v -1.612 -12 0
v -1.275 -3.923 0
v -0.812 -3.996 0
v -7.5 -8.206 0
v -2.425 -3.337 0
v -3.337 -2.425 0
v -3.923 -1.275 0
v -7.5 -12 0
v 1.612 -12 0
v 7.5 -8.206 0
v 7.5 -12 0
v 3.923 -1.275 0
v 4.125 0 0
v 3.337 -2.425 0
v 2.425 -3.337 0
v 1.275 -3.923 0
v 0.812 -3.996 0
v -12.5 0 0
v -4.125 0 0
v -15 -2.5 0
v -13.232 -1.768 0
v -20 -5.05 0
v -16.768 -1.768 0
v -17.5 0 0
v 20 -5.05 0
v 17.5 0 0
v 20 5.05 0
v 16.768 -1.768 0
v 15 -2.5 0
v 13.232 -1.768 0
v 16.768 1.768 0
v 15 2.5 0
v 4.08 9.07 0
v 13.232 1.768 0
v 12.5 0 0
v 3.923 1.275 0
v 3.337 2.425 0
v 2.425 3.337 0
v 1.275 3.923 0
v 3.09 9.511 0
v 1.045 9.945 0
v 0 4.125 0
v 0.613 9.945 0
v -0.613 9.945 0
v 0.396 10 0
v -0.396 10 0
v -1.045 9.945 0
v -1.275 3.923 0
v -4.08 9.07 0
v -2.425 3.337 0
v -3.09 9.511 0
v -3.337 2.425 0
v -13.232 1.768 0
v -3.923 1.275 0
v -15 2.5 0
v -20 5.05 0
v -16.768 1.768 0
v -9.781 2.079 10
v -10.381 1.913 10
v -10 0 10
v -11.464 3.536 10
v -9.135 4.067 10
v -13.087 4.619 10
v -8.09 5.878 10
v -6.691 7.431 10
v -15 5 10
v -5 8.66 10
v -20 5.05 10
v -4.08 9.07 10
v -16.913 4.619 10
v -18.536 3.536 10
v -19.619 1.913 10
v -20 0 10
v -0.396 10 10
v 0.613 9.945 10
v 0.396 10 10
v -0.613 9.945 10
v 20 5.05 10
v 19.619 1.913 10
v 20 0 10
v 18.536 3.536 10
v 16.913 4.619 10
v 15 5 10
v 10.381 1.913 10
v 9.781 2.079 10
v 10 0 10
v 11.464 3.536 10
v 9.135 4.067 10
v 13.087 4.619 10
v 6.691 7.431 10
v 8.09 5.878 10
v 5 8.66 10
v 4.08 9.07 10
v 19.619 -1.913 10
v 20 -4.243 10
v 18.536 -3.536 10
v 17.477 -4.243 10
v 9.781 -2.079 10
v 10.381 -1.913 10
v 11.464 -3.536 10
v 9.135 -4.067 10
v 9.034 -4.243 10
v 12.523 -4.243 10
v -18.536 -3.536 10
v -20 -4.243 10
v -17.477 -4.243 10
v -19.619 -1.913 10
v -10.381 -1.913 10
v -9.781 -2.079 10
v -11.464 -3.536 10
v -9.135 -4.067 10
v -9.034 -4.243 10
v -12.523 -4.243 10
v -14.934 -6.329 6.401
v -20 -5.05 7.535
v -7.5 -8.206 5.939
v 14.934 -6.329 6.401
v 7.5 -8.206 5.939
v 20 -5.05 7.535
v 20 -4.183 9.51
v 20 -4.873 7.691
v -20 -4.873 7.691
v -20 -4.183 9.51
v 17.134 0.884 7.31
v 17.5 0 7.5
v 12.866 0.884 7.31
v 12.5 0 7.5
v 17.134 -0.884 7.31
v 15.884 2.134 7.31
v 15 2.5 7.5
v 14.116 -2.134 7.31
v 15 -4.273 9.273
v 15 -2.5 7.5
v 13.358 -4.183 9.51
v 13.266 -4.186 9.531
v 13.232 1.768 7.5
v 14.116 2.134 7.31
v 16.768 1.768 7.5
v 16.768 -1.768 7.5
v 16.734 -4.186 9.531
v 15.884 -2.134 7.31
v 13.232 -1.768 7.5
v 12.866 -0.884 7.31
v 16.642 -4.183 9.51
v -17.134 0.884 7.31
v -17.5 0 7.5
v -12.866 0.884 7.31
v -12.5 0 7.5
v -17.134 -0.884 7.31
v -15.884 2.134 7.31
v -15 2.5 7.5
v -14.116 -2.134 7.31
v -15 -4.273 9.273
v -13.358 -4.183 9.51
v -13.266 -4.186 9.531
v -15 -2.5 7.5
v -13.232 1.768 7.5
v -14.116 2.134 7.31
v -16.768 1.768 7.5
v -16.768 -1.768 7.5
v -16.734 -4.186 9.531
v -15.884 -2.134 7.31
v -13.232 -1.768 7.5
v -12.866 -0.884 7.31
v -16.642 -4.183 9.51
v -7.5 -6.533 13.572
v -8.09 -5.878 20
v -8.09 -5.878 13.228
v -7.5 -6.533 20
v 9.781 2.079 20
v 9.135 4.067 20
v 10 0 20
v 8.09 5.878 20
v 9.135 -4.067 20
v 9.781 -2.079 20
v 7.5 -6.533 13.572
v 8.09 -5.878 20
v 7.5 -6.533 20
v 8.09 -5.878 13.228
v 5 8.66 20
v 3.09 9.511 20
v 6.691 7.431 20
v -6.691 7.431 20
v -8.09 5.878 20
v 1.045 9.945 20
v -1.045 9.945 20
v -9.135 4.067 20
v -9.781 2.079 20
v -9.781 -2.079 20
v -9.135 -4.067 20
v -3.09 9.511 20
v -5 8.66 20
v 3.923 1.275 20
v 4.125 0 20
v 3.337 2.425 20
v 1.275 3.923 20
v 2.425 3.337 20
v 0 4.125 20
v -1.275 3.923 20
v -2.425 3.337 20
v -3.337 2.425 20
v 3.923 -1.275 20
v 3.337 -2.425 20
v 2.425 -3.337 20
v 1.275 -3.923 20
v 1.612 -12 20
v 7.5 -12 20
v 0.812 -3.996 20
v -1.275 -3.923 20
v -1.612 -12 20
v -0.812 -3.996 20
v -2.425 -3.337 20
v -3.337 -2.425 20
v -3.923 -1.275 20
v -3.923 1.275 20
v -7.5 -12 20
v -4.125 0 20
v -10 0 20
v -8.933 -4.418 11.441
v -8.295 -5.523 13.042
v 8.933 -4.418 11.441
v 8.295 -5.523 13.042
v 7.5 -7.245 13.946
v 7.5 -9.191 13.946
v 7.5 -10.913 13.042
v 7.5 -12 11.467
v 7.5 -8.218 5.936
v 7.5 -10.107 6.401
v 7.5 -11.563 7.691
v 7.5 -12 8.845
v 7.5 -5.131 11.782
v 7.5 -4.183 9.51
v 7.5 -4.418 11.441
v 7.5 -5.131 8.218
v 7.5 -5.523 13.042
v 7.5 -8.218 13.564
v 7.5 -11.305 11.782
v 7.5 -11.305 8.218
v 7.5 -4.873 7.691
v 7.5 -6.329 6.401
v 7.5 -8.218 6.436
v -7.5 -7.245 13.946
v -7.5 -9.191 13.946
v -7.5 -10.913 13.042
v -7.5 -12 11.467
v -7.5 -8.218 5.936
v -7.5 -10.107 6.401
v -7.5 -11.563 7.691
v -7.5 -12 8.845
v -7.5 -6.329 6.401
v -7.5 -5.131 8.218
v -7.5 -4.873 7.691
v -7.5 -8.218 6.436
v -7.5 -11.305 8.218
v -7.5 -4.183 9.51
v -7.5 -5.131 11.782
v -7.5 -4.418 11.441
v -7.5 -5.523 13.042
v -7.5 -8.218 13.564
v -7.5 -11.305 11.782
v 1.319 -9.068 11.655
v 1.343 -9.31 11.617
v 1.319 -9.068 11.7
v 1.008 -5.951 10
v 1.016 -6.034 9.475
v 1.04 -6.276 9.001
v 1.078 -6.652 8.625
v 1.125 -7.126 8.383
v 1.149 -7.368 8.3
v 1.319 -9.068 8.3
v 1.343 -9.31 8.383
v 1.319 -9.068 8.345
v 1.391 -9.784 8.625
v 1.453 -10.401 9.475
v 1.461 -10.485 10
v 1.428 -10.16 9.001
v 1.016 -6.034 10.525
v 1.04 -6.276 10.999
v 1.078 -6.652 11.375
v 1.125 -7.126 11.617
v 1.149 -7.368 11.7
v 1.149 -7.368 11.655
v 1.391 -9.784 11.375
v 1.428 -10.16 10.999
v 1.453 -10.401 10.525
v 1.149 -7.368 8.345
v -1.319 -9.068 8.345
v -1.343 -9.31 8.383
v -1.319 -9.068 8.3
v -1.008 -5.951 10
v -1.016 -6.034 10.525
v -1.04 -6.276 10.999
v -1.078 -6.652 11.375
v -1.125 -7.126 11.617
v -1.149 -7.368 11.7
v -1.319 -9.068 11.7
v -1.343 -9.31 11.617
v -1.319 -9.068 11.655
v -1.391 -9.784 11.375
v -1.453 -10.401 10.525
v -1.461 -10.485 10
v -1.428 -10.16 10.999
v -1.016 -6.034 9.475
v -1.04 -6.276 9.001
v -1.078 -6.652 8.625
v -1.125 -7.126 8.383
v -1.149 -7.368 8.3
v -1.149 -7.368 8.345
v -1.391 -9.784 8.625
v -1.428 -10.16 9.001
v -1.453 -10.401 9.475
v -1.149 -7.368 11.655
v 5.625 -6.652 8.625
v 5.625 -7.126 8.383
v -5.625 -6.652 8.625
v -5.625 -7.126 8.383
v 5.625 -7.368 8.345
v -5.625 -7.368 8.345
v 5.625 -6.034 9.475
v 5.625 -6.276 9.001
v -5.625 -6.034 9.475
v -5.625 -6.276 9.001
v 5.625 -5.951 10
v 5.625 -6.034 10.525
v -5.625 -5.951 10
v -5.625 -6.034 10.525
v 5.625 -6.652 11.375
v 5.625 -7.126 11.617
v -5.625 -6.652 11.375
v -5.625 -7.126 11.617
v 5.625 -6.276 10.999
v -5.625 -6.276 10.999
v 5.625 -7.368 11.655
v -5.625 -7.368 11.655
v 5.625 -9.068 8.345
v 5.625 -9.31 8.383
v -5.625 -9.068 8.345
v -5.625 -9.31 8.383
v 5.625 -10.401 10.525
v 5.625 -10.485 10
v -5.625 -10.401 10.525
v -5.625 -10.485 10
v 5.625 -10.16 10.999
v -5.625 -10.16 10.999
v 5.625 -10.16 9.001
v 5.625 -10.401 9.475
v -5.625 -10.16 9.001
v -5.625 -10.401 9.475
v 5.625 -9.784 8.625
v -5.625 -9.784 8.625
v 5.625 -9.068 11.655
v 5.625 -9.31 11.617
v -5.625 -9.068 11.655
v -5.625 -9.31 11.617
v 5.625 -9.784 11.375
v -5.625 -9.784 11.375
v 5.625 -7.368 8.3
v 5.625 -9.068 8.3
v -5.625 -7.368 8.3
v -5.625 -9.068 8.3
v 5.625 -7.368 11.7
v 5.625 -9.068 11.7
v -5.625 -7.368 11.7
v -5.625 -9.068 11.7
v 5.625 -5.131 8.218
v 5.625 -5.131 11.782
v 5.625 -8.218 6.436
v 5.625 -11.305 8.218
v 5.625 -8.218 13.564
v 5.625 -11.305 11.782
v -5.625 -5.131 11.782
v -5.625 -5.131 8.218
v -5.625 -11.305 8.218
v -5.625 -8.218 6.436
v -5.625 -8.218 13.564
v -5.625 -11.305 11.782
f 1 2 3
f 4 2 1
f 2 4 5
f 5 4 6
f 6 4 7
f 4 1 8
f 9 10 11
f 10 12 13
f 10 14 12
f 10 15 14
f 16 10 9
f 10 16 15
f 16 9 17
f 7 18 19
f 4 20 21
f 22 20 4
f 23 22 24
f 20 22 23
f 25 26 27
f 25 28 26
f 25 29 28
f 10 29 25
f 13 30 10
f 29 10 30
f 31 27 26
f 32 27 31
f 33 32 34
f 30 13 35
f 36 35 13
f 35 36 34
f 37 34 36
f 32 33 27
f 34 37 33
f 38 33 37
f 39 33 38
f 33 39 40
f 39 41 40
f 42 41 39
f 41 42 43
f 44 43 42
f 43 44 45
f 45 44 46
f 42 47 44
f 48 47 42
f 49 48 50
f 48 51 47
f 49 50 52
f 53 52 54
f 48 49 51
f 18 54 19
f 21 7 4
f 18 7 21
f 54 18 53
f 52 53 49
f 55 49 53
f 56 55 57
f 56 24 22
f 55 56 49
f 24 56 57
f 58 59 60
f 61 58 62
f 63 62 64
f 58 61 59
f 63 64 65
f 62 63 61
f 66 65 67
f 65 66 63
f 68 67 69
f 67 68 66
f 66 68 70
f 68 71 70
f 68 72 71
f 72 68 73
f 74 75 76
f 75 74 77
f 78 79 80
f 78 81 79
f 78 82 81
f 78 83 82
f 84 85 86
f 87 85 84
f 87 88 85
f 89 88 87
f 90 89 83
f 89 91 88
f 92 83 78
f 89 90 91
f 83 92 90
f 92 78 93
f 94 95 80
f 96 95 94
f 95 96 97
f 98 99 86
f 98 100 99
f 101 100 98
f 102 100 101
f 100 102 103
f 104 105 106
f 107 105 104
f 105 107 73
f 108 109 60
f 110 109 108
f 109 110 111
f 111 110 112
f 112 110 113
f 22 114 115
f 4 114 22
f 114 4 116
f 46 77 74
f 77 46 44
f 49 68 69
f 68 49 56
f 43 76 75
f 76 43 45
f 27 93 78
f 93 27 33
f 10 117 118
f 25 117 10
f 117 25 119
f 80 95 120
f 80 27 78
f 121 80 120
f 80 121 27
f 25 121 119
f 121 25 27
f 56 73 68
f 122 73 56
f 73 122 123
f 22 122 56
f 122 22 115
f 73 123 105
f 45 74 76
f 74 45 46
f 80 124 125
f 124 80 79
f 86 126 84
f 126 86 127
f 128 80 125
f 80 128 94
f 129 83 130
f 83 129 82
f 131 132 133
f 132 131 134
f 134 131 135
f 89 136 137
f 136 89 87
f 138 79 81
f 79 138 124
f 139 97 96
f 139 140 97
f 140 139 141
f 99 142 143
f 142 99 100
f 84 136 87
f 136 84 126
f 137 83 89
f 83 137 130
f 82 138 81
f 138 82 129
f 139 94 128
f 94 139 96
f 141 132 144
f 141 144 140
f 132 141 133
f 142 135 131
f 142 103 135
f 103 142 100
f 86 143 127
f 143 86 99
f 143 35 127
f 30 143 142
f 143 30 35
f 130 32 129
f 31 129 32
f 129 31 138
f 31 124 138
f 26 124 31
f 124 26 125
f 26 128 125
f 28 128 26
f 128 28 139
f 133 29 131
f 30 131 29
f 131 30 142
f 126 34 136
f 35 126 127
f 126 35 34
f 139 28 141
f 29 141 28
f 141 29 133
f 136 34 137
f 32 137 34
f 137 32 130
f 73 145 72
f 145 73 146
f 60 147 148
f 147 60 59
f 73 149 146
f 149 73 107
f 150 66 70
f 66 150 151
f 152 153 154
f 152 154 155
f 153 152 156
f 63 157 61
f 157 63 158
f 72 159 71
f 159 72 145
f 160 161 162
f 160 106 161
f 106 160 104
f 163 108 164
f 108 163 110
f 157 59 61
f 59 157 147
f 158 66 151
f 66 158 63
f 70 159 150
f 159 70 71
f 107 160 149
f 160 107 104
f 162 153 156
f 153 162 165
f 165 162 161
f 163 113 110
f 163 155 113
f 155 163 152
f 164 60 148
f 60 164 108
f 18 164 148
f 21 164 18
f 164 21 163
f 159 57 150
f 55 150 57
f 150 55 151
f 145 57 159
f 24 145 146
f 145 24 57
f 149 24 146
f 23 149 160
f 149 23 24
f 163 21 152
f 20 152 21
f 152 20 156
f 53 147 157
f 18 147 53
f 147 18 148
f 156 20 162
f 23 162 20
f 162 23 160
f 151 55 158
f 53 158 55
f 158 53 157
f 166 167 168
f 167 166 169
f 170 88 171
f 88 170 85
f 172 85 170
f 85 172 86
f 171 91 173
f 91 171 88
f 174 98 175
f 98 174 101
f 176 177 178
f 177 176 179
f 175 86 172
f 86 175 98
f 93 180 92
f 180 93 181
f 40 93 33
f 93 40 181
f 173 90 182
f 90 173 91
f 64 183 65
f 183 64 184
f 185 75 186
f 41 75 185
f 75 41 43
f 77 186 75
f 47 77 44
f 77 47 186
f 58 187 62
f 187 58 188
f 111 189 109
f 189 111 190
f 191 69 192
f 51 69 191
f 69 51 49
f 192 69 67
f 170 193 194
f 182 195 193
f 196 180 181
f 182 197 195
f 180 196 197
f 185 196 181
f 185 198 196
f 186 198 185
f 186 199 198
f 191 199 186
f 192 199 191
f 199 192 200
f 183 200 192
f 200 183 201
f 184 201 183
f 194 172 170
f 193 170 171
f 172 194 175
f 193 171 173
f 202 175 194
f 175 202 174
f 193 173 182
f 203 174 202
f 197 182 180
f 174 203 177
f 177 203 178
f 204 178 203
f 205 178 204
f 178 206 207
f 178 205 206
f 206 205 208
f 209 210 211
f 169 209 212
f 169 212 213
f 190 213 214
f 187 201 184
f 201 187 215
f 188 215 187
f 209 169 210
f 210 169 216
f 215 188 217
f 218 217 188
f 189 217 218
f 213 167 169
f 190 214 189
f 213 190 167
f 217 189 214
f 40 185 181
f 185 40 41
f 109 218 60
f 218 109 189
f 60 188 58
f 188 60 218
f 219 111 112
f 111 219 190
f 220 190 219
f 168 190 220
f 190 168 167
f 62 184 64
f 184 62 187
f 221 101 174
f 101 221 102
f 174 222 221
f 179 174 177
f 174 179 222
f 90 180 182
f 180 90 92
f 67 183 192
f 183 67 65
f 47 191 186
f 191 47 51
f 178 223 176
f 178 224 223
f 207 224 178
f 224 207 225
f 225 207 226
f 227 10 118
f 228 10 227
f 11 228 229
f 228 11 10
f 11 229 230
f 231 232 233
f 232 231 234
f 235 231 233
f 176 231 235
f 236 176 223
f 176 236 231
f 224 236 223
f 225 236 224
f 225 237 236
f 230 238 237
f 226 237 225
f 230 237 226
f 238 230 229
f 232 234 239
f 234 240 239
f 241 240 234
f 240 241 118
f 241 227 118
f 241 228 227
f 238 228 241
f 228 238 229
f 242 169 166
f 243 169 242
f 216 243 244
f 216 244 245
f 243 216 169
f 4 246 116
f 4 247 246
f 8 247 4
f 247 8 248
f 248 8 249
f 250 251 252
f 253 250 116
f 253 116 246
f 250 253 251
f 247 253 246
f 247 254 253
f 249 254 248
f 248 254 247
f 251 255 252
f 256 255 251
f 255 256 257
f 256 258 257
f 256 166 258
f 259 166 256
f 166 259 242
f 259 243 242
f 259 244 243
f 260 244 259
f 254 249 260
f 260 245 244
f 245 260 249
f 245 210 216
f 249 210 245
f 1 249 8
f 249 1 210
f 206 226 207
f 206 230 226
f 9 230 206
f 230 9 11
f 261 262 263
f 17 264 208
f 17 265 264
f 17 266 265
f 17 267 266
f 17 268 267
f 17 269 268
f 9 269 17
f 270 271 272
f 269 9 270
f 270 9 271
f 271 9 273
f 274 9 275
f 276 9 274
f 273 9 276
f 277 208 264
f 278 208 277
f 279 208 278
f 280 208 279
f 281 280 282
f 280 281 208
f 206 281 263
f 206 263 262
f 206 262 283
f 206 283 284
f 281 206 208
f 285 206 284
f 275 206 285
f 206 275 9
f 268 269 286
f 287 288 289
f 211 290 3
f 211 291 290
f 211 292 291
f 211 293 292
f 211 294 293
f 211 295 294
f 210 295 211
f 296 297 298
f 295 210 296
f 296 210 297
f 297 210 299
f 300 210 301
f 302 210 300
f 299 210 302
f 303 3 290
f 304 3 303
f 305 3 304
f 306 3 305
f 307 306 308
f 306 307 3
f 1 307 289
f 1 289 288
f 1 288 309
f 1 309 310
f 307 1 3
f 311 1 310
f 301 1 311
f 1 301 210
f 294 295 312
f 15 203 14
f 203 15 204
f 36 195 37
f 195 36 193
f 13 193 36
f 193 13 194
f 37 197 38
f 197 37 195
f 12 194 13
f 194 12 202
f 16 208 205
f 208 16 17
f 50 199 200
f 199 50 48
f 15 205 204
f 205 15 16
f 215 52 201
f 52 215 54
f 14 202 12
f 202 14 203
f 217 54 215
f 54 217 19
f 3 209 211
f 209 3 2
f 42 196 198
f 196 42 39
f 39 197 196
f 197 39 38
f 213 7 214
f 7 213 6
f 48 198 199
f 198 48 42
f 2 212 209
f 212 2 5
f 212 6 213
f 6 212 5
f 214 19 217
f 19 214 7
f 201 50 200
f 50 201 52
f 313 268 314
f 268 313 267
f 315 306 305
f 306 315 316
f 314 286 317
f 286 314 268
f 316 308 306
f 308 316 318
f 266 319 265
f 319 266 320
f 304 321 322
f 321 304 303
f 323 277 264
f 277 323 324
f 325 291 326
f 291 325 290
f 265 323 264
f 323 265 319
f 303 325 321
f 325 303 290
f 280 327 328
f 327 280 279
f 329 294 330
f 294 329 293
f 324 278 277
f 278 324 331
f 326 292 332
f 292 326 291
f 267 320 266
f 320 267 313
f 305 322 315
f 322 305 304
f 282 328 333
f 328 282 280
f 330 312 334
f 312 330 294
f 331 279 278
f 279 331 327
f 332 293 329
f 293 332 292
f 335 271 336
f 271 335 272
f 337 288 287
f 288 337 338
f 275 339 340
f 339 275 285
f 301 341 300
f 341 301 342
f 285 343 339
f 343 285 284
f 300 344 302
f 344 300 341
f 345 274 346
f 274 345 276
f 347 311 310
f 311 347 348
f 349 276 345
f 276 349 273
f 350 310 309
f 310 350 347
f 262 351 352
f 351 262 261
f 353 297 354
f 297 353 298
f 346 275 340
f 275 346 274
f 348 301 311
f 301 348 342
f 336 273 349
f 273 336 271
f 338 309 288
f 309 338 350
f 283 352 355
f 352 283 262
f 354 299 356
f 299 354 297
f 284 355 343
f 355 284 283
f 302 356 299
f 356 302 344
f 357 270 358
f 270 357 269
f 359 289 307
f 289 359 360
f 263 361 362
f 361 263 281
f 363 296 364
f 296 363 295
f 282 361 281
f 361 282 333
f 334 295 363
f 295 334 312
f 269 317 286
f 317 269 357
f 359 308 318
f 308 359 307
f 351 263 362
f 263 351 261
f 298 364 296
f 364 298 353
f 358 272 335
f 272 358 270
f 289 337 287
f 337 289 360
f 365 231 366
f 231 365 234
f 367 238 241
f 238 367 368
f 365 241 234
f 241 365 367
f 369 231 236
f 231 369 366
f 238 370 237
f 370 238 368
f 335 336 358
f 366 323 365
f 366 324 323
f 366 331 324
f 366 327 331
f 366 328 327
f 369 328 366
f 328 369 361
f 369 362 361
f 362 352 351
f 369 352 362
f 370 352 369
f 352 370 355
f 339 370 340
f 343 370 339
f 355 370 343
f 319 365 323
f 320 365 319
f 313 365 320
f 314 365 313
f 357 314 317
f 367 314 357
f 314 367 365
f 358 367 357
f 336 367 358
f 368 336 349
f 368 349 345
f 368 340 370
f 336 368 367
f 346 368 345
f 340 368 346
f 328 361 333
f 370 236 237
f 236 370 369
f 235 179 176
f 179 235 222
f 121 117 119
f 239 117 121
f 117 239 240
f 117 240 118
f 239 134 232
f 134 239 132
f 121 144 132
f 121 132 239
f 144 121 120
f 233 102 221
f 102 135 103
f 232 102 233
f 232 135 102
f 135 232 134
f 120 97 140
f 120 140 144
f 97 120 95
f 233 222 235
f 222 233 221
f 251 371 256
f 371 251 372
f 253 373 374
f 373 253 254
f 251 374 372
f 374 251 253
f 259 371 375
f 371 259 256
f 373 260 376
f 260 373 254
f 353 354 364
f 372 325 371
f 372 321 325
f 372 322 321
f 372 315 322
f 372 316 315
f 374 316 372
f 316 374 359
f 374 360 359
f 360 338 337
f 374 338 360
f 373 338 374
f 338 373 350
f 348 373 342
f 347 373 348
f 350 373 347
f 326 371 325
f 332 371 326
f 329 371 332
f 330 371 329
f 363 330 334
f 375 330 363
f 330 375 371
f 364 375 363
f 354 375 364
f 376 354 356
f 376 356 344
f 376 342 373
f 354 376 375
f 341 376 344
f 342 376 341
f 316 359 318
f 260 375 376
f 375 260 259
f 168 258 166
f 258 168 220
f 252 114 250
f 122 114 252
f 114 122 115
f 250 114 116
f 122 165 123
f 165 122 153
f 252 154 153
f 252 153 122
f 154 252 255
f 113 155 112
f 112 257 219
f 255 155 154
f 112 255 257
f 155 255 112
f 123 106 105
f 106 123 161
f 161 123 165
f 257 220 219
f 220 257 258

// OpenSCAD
/* 
SHF-inspired shaft clamp for 3D print
While not accurate to SHF dimensions, this design is meant to provide a working prototype
similar in dimensions, for quick and cheap 3D printed clamps, using a fastening bolt + hex nut.
Print with 40% 3D honeycomb infill, no supports. PETG / ABS / Nylon preferred.
Part of the Tannerino project: https://hackaday.io/project/133879-tannerino
Designed by Uri Shani, usdogi_at_gmail.com June 10th, 2018. Published under CC0-1.0: https://creativecommons.org/publicdomain/zero/1.0/
Disclaimer:
This design is not intended for high loads, and is assumed to be used as placement aid only.
Author assumes no liability, and may not be held responsible for misuse of the design.
*/ 

//Change this section
basicDiameter = 8; // held shaft diameter
postHeight = 20; // held shaft post height
screwHole = 4; //fastening screws diameter
chamferedScrew = true; //are fastening screws countersunk?
clampingBolt = 3; //clamping bolt diameter. creates slot + countersink
hexNutWidthAcrossFlats = 6; //for countersunk hex nut
hexNutThickness = 2.5; //for countersunk hex nut

//Do not change unless you know what you are doing!
rad1 = (basicDiameter + 0.25) / 2;
rad2 = postHeight / 2;
keyHeight = rad1 * 5;
earLength = rad2 * 4;
earHeight = postHeight / 2; 
wingtipA = rad2 + 0.1;
screwRad = (screwHole / 2) + 0.5;
clampingBoltDrillSlotRad = (clampingBolt / 2) + 0.2;
hexNutCirRad = ((hexNutWidthAcrossFlats * (2 / sqrt(3))) + 0.2) / 2;
hexNutDepth = (postHeight*0.75)/2 - (hexNutThickness * 0.75);
boltCounterSink = (postHeight*0.75)/2;

use <MCAD/triangles.scad>

module regular_polygon(order, rad){
        angles=[ for (i = [0:order-1]) i*(360/order) ];
        coords=[ for (th=angles) [rad*cos(th), rad*sin(th)] ];
        polygon(coords);
 }

difference() {
    union() {
        //main shaft post
        cylinder(h = postHeight, r = rad2);
        //clamping bolt extension
        translate([-(postHeight-(postHeight*0.25))/2, -postHeight*0.6, 0]) 
          cube([postHeight*0.75, postHeight/2, postHeight]);
        //clamping ears and chamfers
        difference() {
            difference() {
                translate([0, 0, earHeight / 2]) 
                  cube([earLength, rad2 * 2, earHeight], true);
                union() {
                    for(i = [1:4]) {
                        j = (i % 2) ? 1:-1;
                        k = (i % 2) ? 1:0;
                        m = (i % 2) ? i:(i-1);
                        //echo(i, j, k, m);
                        mirror([k, 0, 0]) rotate([0, 0, m * 90])
                        translate([-j * wingtipA, -j * earLength, 0])
                          triangle(o_len = j * earLength, a_len = j * wingtipA, depth = earHeight);
                     }
                  }
             }
            union () {
                //clamping screws section
                for (n = [0:1]) {
                    mirror([n, 0, 0]) {
                        translate([rad2*1.5, 0, 0]) {
                             majorRad = chamferedScrew ? (screwRad*2):screwRad;
                           translate([0, 0, earHeight-majorRad]) 
                             cylinder(h = majorRad, r1 = 0, r2 = majorRad, center = false);
                           cylinder(r = screwRad, h = earHeight);
                        }
                    }
                }
            }
        }
    }
    union() {
        //keyhole for main shaft and triangular slot for tightening
        cylinder(r = rad1, h = postHeight, $fn = 20);
        translate(v = [0, -((keyHeight) - rad1), 0]) {
            union() {
                triangle(o_len = keyHeight, a_len = rad1 / 2, depth = postHeight);
                mirror([1, 0, 0]) {
                    triangle(o_len = keyHeight, a_len = rad1 / 2, depth = postHeight);
                }
              }
            }
        }
    
    //clamping bolt section    
    translate([0, -rad2 + hexNutCirRad/2, earHeight]) rotate([0, 90, 0]) {
      union() {
          //clamping bolt shaft slot
          cube([clampingBoltDrillSlotRad * 2,clampingBoltDrillSlotRad, earLength], center = true);
          for(s = [0:1])
              mirror([0, s, 0])
                translate ([0, clampingBoltDrillSlotRad/3, 0]) 
                  cylinder(r = clampingBoltDrillSlotRad, h = earLength, center = true, $fn = 20);
      }
      for (t = [0:1])
        mirror([0, 0, t]) {
            //hex nut countersink
            translate([0, 0, hexNutDepth])
            linear_extrude(h = earLength, center = false)
            regular_polygon(order = 6, rad = hexNutCirRad);
            //clamping bolt head countersink
            translate([0, 0, boltCounterSink])
              cylinder(r = hexNutCirRad + 0.5, h = earLength, center = false);
        }
    }
}
